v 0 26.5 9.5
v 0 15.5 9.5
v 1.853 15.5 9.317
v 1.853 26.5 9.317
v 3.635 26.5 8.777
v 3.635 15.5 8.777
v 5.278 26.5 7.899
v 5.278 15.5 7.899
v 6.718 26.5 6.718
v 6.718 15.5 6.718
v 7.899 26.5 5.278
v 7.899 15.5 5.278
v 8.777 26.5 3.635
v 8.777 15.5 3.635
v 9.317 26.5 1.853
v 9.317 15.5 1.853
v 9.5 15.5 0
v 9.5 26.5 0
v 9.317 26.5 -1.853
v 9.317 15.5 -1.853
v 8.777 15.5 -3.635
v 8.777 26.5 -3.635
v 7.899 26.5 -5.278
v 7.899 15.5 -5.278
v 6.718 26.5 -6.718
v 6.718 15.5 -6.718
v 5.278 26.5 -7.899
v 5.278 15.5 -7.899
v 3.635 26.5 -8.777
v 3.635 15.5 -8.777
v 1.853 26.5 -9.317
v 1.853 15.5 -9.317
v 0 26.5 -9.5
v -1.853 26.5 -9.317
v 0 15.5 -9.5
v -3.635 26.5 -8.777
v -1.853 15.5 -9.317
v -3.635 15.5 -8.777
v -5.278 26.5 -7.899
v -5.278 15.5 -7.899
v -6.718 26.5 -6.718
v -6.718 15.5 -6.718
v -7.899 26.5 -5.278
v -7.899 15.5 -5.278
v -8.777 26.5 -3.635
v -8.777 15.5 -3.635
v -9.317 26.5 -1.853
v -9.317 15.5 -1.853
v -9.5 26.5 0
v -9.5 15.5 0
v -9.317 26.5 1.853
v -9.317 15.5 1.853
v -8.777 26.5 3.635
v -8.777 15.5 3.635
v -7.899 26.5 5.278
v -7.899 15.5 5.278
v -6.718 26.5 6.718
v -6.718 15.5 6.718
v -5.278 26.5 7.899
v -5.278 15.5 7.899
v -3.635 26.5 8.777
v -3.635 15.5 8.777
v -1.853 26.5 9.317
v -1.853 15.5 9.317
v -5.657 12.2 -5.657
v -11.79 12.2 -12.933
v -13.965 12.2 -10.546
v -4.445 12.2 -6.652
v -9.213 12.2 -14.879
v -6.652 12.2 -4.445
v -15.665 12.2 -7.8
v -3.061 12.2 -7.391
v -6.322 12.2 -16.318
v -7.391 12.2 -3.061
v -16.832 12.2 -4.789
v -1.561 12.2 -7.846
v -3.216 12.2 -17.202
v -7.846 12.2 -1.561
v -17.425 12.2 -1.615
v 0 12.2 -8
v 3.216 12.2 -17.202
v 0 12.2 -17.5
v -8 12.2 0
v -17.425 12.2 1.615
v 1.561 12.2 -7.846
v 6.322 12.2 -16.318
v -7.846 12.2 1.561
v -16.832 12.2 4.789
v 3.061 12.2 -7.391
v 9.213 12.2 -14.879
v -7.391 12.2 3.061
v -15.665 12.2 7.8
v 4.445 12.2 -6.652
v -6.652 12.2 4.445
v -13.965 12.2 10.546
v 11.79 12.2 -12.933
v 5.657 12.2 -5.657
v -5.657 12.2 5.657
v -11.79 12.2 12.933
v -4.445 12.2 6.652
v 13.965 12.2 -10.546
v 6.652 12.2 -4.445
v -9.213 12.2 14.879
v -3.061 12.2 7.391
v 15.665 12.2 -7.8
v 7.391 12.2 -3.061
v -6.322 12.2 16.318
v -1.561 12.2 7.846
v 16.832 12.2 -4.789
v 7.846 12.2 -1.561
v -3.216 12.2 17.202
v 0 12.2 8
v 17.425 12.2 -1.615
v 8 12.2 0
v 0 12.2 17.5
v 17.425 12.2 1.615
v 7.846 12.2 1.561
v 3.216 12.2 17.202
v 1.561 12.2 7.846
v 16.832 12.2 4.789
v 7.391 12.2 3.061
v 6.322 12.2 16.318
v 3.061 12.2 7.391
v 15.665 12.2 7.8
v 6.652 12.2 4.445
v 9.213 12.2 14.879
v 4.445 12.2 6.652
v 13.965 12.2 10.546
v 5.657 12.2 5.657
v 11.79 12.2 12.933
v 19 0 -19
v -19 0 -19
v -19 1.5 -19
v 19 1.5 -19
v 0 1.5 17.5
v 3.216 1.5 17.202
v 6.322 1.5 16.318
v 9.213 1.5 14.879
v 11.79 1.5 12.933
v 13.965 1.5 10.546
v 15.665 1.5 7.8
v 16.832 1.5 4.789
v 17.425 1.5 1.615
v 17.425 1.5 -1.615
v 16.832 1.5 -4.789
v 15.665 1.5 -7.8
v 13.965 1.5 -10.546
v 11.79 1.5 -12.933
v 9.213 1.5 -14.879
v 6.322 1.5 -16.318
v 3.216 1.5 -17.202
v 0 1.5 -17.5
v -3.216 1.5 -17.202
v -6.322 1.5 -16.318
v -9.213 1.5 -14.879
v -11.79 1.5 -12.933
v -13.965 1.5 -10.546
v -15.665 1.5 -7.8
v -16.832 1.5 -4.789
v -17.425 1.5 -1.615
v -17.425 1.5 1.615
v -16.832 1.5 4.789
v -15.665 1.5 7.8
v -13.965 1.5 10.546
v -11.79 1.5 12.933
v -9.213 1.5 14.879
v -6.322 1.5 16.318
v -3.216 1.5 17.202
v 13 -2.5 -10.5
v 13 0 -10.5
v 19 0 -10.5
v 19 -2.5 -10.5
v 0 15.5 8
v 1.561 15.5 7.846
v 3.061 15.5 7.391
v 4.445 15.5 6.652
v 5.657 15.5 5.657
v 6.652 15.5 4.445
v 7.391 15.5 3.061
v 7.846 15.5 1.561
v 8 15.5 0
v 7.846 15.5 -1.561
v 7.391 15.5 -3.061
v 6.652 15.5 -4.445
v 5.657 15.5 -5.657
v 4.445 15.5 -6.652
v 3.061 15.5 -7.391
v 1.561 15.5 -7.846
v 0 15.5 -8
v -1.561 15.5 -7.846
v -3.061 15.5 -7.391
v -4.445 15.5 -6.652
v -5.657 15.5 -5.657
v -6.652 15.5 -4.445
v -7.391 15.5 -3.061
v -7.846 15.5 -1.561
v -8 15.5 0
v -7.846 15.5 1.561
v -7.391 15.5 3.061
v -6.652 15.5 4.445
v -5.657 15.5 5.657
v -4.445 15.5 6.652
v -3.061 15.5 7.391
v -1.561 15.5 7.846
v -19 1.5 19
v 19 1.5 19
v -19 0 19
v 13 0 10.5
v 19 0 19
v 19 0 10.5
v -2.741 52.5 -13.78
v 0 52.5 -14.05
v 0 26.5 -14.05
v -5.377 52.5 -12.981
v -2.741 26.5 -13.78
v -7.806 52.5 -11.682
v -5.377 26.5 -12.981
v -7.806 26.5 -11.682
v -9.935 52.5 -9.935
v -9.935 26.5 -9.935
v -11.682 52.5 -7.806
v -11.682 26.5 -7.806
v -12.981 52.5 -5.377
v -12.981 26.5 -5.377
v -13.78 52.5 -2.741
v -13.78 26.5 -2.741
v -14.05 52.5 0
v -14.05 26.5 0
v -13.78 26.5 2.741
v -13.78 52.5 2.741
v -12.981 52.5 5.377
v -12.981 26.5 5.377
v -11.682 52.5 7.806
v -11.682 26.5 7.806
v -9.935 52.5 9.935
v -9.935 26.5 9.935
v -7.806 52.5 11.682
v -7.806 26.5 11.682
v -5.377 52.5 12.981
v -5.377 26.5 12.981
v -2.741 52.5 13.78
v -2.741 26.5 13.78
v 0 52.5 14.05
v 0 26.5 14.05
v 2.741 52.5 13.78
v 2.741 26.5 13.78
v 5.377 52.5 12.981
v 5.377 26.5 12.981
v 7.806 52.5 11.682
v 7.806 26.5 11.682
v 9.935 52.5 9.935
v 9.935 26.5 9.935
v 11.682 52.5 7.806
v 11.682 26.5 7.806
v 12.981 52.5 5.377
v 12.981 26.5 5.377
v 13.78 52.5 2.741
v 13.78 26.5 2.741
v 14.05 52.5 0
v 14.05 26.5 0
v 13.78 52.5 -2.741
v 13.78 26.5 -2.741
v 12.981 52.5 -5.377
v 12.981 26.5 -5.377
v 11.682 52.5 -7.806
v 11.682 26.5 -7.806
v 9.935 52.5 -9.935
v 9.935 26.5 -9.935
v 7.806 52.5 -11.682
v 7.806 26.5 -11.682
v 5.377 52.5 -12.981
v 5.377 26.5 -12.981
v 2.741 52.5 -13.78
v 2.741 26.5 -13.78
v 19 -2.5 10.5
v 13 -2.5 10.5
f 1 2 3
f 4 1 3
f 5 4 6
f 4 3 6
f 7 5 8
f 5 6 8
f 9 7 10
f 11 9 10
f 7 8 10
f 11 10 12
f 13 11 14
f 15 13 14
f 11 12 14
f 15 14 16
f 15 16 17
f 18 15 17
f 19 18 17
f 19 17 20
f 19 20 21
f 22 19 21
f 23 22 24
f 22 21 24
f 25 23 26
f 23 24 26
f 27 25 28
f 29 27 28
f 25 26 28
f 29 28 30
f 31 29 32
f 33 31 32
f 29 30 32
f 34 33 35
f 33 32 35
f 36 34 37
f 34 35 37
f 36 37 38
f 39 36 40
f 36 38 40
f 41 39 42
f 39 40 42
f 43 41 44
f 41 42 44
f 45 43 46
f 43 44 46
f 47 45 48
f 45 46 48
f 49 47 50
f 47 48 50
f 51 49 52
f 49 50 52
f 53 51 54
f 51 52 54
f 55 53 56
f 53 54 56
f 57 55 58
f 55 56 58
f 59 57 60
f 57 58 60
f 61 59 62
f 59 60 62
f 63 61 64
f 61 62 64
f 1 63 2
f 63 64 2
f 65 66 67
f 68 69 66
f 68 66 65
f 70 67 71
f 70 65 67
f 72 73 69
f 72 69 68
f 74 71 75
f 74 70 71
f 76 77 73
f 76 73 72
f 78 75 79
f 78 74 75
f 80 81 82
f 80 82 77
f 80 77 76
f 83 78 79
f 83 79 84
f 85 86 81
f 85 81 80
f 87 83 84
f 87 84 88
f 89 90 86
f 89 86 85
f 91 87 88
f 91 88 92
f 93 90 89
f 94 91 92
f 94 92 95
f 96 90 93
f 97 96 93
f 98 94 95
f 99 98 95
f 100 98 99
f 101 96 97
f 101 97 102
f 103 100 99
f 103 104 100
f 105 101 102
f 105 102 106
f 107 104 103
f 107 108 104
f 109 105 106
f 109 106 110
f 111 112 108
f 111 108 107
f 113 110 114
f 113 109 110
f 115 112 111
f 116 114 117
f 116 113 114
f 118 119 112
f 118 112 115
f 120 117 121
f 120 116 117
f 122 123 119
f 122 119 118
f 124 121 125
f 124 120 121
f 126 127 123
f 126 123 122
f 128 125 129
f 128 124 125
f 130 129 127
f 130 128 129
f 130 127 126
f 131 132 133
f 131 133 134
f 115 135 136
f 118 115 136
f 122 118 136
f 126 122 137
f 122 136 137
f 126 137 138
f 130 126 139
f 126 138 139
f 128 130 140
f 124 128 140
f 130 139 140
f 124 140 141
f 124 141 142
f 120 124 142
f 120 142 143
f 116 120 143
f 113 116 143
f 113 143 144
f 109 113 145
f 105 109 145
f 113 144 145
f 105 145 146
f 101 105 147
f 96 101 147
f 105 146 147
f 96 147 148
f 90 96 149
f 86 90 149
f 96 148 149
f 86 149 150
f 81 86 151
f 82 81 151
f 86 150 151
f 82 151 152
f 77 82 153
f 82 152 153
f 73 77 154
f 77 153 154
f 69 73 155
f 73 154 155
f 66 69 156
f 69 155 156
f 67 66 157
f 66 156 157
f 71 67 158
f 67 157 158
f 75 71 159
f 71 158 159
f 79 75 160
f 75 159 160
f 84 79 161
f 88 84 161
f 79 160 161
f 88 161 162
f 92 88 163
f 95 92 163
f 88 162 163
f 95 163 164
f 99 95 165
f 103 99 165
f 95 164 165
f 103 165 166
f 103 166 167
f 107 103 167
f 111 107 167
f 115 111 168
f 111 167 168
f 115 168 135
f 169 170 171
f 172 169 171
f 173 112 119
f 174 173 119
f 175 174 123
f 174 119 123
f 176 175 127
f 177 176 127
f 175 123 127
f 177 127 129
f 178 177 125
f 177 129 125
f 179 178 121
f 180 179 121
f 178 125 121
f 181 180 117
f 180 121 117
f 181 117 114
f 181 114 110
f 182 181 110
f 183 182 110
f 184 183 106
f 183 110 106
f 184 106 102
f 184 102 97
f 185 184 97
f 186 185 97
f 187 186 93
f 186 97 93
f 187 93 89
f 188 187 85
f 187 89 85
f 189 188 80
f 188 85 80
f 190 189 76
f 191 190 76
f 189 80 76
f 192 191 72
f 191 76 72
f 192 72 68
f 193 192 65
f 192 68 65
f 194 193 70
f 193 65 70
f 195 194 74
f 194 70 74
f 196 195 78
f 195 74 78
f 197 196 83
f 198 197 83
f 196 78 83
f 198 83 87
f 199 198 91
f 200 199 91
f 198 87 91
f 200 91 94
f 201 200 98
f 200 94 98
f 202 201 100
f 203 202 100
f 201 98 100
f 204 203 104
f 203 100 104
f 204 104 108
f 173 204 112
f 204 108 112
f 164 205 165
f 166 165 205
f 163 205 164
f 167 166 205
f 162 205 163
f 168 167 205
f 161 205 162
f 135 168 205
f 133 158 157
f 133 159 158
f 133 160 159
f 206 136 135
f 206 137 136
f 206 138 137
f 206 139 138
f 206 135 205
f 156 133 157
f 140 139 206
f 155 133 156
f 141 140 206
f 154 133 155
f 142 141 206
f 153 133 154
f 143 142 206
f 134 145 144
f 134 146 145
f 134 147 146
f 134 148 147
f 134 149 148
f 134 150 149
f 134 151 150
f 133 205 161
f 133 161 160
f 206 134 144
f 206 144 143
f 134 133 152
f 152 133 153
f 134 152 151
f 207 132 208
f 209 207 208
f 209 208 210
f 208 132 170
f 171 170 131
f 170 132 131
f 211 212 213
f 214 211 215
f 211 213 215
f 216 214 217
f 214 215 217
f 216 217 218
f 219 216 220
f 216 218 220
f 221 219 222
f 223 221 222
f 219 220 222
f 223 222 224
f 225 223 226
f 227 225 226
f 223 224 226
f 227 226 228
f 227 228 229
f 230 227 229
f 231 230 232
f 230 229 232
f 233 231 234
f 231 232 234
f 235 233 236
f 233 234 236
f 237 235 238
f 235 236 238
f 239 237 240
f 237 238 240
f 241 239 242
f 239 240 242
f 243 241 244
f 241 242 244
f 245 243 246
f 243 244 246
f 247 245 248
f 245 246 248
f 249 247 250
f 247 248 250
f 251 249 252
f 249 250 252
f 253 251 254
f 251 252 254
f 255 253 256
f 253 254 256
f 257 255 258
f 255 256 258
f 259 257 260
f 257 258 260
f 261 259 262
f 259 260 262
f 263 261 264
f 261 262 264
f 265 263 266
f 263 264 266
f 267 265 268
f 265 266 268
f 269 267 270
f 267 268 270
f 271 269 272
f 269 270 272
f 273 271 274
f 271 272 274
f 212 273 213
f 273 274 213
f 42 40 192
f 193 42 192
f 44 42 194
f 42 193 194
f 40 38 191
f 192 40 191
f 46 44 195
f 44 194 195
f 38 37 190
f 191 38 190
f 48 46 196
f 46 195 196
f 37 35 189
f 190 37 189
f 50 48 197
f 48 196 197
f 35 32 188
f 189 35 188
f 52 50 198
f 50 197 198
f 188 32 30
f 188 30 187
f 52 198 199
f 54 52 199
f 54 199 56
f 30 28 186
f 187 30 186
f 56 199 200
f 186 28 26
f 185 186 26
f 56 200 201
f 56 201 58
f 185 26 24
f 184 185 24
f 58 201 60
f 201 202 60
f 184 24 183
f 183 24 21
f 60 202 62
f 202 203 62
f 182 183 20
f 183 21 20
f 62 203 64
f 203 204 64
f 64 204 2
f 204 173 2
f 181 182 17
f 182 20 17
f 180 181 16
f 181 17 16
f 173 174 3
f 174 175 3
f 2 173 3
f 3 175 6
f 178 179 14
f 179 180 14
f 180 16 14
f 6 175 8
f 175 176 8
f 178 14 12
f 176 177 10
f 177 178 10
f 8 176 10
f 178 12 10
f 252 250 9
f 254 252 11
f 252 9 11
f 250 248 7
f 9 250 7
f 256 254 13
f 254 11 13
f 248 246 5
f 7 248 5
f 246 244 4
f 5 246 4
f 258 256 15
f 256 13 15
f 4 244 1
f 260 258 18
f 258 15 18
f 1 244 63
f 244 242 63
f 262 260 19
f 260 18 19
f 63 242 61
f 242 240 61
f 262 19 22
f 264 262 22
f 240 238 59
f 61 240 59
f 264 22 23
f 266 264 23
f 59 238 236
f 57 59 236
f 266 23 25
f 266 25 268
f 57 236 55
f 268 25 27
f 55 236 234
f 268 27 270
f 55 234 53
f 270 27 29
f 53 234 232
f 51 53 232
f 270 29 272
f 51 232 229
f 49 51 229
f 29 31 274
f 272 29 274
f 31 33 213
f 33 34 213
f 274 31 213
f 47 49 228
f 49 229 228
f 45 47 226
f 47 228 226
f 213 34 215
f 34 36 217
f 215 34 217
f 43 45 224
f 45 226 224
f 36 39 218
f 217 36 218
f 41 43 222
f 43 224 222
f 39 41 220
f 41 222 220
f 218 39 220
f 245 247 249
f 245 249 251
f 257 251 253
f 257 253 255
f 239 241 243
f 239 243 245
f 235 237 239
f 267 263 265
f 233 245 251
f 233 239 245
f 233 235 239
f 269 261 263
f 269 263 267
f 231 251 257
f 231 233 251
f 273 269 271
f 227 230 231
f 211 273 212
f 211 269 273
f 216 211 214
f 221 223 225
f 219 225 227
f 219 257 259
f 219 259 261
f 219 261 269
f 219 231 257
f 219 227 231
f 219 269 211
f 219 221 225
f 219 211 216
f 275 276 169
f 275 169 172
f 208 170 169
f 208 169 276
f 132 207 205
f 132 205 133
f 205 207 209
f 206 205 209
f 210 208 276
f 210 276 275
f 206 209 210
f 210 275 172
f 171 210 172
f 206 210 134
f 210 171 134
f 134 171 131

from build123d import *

# Parameters (mm, degrees)
SKETCH1_W           = 38
SKETCH1_H           = 38
BOSS_EXTRUDE1_DEPTH = 1.5
SKETCH2_R           = 17.5
BOSS_EXTRUDE2_DEPTH = 10.7
SKETCH3_R           = 8
BOSS_EXTRUDE3_DEPTH = 3.3
SKETCH4_R           = 9.5
BOSS_EXTRUDE4_DEPTH = 11
SKETCH5_R           = 14.05
BOSS_EXTRUDE5_DEPTH = 26
SKETCH7_W           = 6
SKETCH7_H           = 21
BOSS_EXTRUDE6_DEPTH = 2.5


with BuildPart() as part:
    # Sketch1 → Boss-Extrude1 (new body)
    with BuildSketch(Plane(origin=(0, 0, 0), x_dir=(1, 0, 0), z_dir=(0, 1, 0))):
        Rectangle(SKETCH1_W, SKETCH1_H)
    extrude(amount=BOSS_EXTRUDE1_DEPTH)

    # Sketch2 → Boss-Extrude2 (add)
    with BuildSketch(Plane(origin=(0, 1.5, 0), x_dir=(1, 0, 0), z_dir=(0, 1, 0))):
        with Locations(Location((0, 0, 0), (0, 0, 270))):
            Circle(SKETCH2_R)
    extrude(amount=BOSS_EXTRUDE2_DEPTH)

    # Sketch3 → Boss-Extrude3 (add)
    with BuildSketch(Plane(origin=(0, 12.2, 0), x_dir=(1, 0, 0), z_dir=(0, 1, 0))):
        with Locations(Location((0, 0, 0), (0, 0, 270))):
            Circle(SKETCH3_R)
    extrude(amount=BOSS_EXTRUDE3_DEPTH)

    # Sketch4 → Boss-Extrude4 (add)
    with BuildSketch(Plane(origin=(0, 15.5, 0), x_dir=(1, 0, 0), z_dir=(0, 1, 0))):
        with Locations(Location((0, 0, 0), (0, 0, 270))):
            Circle(SKETCH4_R)
    extrude(amount=BOSS_EXTRUDE4_DEPTH)

    # Sketch5 → Boss-Extrude5 (add)
    with BuildSketch(Plane(origin=(0, 26.5, 0), x_dir=(1, 0, 0), z_dir=(0, 1, 0))):
        with Locations(Location((0, 0, 0), (0, 0, 90))):
            Circle(SKETCH5_R)
    extrude(amount=BOSS_EXTRUDE5_DEPTH)

    # Sketch7 → Boss-Extrude6 (add)
    with BuildSketch(Plane.XZ):
        with Locations((16, 0)):
            Rectangle(SKETCH7_W, SKETCH7_H)
    extrude(amount=BOSS_EXTRUDE6_DEPTH)


solid = part.part
